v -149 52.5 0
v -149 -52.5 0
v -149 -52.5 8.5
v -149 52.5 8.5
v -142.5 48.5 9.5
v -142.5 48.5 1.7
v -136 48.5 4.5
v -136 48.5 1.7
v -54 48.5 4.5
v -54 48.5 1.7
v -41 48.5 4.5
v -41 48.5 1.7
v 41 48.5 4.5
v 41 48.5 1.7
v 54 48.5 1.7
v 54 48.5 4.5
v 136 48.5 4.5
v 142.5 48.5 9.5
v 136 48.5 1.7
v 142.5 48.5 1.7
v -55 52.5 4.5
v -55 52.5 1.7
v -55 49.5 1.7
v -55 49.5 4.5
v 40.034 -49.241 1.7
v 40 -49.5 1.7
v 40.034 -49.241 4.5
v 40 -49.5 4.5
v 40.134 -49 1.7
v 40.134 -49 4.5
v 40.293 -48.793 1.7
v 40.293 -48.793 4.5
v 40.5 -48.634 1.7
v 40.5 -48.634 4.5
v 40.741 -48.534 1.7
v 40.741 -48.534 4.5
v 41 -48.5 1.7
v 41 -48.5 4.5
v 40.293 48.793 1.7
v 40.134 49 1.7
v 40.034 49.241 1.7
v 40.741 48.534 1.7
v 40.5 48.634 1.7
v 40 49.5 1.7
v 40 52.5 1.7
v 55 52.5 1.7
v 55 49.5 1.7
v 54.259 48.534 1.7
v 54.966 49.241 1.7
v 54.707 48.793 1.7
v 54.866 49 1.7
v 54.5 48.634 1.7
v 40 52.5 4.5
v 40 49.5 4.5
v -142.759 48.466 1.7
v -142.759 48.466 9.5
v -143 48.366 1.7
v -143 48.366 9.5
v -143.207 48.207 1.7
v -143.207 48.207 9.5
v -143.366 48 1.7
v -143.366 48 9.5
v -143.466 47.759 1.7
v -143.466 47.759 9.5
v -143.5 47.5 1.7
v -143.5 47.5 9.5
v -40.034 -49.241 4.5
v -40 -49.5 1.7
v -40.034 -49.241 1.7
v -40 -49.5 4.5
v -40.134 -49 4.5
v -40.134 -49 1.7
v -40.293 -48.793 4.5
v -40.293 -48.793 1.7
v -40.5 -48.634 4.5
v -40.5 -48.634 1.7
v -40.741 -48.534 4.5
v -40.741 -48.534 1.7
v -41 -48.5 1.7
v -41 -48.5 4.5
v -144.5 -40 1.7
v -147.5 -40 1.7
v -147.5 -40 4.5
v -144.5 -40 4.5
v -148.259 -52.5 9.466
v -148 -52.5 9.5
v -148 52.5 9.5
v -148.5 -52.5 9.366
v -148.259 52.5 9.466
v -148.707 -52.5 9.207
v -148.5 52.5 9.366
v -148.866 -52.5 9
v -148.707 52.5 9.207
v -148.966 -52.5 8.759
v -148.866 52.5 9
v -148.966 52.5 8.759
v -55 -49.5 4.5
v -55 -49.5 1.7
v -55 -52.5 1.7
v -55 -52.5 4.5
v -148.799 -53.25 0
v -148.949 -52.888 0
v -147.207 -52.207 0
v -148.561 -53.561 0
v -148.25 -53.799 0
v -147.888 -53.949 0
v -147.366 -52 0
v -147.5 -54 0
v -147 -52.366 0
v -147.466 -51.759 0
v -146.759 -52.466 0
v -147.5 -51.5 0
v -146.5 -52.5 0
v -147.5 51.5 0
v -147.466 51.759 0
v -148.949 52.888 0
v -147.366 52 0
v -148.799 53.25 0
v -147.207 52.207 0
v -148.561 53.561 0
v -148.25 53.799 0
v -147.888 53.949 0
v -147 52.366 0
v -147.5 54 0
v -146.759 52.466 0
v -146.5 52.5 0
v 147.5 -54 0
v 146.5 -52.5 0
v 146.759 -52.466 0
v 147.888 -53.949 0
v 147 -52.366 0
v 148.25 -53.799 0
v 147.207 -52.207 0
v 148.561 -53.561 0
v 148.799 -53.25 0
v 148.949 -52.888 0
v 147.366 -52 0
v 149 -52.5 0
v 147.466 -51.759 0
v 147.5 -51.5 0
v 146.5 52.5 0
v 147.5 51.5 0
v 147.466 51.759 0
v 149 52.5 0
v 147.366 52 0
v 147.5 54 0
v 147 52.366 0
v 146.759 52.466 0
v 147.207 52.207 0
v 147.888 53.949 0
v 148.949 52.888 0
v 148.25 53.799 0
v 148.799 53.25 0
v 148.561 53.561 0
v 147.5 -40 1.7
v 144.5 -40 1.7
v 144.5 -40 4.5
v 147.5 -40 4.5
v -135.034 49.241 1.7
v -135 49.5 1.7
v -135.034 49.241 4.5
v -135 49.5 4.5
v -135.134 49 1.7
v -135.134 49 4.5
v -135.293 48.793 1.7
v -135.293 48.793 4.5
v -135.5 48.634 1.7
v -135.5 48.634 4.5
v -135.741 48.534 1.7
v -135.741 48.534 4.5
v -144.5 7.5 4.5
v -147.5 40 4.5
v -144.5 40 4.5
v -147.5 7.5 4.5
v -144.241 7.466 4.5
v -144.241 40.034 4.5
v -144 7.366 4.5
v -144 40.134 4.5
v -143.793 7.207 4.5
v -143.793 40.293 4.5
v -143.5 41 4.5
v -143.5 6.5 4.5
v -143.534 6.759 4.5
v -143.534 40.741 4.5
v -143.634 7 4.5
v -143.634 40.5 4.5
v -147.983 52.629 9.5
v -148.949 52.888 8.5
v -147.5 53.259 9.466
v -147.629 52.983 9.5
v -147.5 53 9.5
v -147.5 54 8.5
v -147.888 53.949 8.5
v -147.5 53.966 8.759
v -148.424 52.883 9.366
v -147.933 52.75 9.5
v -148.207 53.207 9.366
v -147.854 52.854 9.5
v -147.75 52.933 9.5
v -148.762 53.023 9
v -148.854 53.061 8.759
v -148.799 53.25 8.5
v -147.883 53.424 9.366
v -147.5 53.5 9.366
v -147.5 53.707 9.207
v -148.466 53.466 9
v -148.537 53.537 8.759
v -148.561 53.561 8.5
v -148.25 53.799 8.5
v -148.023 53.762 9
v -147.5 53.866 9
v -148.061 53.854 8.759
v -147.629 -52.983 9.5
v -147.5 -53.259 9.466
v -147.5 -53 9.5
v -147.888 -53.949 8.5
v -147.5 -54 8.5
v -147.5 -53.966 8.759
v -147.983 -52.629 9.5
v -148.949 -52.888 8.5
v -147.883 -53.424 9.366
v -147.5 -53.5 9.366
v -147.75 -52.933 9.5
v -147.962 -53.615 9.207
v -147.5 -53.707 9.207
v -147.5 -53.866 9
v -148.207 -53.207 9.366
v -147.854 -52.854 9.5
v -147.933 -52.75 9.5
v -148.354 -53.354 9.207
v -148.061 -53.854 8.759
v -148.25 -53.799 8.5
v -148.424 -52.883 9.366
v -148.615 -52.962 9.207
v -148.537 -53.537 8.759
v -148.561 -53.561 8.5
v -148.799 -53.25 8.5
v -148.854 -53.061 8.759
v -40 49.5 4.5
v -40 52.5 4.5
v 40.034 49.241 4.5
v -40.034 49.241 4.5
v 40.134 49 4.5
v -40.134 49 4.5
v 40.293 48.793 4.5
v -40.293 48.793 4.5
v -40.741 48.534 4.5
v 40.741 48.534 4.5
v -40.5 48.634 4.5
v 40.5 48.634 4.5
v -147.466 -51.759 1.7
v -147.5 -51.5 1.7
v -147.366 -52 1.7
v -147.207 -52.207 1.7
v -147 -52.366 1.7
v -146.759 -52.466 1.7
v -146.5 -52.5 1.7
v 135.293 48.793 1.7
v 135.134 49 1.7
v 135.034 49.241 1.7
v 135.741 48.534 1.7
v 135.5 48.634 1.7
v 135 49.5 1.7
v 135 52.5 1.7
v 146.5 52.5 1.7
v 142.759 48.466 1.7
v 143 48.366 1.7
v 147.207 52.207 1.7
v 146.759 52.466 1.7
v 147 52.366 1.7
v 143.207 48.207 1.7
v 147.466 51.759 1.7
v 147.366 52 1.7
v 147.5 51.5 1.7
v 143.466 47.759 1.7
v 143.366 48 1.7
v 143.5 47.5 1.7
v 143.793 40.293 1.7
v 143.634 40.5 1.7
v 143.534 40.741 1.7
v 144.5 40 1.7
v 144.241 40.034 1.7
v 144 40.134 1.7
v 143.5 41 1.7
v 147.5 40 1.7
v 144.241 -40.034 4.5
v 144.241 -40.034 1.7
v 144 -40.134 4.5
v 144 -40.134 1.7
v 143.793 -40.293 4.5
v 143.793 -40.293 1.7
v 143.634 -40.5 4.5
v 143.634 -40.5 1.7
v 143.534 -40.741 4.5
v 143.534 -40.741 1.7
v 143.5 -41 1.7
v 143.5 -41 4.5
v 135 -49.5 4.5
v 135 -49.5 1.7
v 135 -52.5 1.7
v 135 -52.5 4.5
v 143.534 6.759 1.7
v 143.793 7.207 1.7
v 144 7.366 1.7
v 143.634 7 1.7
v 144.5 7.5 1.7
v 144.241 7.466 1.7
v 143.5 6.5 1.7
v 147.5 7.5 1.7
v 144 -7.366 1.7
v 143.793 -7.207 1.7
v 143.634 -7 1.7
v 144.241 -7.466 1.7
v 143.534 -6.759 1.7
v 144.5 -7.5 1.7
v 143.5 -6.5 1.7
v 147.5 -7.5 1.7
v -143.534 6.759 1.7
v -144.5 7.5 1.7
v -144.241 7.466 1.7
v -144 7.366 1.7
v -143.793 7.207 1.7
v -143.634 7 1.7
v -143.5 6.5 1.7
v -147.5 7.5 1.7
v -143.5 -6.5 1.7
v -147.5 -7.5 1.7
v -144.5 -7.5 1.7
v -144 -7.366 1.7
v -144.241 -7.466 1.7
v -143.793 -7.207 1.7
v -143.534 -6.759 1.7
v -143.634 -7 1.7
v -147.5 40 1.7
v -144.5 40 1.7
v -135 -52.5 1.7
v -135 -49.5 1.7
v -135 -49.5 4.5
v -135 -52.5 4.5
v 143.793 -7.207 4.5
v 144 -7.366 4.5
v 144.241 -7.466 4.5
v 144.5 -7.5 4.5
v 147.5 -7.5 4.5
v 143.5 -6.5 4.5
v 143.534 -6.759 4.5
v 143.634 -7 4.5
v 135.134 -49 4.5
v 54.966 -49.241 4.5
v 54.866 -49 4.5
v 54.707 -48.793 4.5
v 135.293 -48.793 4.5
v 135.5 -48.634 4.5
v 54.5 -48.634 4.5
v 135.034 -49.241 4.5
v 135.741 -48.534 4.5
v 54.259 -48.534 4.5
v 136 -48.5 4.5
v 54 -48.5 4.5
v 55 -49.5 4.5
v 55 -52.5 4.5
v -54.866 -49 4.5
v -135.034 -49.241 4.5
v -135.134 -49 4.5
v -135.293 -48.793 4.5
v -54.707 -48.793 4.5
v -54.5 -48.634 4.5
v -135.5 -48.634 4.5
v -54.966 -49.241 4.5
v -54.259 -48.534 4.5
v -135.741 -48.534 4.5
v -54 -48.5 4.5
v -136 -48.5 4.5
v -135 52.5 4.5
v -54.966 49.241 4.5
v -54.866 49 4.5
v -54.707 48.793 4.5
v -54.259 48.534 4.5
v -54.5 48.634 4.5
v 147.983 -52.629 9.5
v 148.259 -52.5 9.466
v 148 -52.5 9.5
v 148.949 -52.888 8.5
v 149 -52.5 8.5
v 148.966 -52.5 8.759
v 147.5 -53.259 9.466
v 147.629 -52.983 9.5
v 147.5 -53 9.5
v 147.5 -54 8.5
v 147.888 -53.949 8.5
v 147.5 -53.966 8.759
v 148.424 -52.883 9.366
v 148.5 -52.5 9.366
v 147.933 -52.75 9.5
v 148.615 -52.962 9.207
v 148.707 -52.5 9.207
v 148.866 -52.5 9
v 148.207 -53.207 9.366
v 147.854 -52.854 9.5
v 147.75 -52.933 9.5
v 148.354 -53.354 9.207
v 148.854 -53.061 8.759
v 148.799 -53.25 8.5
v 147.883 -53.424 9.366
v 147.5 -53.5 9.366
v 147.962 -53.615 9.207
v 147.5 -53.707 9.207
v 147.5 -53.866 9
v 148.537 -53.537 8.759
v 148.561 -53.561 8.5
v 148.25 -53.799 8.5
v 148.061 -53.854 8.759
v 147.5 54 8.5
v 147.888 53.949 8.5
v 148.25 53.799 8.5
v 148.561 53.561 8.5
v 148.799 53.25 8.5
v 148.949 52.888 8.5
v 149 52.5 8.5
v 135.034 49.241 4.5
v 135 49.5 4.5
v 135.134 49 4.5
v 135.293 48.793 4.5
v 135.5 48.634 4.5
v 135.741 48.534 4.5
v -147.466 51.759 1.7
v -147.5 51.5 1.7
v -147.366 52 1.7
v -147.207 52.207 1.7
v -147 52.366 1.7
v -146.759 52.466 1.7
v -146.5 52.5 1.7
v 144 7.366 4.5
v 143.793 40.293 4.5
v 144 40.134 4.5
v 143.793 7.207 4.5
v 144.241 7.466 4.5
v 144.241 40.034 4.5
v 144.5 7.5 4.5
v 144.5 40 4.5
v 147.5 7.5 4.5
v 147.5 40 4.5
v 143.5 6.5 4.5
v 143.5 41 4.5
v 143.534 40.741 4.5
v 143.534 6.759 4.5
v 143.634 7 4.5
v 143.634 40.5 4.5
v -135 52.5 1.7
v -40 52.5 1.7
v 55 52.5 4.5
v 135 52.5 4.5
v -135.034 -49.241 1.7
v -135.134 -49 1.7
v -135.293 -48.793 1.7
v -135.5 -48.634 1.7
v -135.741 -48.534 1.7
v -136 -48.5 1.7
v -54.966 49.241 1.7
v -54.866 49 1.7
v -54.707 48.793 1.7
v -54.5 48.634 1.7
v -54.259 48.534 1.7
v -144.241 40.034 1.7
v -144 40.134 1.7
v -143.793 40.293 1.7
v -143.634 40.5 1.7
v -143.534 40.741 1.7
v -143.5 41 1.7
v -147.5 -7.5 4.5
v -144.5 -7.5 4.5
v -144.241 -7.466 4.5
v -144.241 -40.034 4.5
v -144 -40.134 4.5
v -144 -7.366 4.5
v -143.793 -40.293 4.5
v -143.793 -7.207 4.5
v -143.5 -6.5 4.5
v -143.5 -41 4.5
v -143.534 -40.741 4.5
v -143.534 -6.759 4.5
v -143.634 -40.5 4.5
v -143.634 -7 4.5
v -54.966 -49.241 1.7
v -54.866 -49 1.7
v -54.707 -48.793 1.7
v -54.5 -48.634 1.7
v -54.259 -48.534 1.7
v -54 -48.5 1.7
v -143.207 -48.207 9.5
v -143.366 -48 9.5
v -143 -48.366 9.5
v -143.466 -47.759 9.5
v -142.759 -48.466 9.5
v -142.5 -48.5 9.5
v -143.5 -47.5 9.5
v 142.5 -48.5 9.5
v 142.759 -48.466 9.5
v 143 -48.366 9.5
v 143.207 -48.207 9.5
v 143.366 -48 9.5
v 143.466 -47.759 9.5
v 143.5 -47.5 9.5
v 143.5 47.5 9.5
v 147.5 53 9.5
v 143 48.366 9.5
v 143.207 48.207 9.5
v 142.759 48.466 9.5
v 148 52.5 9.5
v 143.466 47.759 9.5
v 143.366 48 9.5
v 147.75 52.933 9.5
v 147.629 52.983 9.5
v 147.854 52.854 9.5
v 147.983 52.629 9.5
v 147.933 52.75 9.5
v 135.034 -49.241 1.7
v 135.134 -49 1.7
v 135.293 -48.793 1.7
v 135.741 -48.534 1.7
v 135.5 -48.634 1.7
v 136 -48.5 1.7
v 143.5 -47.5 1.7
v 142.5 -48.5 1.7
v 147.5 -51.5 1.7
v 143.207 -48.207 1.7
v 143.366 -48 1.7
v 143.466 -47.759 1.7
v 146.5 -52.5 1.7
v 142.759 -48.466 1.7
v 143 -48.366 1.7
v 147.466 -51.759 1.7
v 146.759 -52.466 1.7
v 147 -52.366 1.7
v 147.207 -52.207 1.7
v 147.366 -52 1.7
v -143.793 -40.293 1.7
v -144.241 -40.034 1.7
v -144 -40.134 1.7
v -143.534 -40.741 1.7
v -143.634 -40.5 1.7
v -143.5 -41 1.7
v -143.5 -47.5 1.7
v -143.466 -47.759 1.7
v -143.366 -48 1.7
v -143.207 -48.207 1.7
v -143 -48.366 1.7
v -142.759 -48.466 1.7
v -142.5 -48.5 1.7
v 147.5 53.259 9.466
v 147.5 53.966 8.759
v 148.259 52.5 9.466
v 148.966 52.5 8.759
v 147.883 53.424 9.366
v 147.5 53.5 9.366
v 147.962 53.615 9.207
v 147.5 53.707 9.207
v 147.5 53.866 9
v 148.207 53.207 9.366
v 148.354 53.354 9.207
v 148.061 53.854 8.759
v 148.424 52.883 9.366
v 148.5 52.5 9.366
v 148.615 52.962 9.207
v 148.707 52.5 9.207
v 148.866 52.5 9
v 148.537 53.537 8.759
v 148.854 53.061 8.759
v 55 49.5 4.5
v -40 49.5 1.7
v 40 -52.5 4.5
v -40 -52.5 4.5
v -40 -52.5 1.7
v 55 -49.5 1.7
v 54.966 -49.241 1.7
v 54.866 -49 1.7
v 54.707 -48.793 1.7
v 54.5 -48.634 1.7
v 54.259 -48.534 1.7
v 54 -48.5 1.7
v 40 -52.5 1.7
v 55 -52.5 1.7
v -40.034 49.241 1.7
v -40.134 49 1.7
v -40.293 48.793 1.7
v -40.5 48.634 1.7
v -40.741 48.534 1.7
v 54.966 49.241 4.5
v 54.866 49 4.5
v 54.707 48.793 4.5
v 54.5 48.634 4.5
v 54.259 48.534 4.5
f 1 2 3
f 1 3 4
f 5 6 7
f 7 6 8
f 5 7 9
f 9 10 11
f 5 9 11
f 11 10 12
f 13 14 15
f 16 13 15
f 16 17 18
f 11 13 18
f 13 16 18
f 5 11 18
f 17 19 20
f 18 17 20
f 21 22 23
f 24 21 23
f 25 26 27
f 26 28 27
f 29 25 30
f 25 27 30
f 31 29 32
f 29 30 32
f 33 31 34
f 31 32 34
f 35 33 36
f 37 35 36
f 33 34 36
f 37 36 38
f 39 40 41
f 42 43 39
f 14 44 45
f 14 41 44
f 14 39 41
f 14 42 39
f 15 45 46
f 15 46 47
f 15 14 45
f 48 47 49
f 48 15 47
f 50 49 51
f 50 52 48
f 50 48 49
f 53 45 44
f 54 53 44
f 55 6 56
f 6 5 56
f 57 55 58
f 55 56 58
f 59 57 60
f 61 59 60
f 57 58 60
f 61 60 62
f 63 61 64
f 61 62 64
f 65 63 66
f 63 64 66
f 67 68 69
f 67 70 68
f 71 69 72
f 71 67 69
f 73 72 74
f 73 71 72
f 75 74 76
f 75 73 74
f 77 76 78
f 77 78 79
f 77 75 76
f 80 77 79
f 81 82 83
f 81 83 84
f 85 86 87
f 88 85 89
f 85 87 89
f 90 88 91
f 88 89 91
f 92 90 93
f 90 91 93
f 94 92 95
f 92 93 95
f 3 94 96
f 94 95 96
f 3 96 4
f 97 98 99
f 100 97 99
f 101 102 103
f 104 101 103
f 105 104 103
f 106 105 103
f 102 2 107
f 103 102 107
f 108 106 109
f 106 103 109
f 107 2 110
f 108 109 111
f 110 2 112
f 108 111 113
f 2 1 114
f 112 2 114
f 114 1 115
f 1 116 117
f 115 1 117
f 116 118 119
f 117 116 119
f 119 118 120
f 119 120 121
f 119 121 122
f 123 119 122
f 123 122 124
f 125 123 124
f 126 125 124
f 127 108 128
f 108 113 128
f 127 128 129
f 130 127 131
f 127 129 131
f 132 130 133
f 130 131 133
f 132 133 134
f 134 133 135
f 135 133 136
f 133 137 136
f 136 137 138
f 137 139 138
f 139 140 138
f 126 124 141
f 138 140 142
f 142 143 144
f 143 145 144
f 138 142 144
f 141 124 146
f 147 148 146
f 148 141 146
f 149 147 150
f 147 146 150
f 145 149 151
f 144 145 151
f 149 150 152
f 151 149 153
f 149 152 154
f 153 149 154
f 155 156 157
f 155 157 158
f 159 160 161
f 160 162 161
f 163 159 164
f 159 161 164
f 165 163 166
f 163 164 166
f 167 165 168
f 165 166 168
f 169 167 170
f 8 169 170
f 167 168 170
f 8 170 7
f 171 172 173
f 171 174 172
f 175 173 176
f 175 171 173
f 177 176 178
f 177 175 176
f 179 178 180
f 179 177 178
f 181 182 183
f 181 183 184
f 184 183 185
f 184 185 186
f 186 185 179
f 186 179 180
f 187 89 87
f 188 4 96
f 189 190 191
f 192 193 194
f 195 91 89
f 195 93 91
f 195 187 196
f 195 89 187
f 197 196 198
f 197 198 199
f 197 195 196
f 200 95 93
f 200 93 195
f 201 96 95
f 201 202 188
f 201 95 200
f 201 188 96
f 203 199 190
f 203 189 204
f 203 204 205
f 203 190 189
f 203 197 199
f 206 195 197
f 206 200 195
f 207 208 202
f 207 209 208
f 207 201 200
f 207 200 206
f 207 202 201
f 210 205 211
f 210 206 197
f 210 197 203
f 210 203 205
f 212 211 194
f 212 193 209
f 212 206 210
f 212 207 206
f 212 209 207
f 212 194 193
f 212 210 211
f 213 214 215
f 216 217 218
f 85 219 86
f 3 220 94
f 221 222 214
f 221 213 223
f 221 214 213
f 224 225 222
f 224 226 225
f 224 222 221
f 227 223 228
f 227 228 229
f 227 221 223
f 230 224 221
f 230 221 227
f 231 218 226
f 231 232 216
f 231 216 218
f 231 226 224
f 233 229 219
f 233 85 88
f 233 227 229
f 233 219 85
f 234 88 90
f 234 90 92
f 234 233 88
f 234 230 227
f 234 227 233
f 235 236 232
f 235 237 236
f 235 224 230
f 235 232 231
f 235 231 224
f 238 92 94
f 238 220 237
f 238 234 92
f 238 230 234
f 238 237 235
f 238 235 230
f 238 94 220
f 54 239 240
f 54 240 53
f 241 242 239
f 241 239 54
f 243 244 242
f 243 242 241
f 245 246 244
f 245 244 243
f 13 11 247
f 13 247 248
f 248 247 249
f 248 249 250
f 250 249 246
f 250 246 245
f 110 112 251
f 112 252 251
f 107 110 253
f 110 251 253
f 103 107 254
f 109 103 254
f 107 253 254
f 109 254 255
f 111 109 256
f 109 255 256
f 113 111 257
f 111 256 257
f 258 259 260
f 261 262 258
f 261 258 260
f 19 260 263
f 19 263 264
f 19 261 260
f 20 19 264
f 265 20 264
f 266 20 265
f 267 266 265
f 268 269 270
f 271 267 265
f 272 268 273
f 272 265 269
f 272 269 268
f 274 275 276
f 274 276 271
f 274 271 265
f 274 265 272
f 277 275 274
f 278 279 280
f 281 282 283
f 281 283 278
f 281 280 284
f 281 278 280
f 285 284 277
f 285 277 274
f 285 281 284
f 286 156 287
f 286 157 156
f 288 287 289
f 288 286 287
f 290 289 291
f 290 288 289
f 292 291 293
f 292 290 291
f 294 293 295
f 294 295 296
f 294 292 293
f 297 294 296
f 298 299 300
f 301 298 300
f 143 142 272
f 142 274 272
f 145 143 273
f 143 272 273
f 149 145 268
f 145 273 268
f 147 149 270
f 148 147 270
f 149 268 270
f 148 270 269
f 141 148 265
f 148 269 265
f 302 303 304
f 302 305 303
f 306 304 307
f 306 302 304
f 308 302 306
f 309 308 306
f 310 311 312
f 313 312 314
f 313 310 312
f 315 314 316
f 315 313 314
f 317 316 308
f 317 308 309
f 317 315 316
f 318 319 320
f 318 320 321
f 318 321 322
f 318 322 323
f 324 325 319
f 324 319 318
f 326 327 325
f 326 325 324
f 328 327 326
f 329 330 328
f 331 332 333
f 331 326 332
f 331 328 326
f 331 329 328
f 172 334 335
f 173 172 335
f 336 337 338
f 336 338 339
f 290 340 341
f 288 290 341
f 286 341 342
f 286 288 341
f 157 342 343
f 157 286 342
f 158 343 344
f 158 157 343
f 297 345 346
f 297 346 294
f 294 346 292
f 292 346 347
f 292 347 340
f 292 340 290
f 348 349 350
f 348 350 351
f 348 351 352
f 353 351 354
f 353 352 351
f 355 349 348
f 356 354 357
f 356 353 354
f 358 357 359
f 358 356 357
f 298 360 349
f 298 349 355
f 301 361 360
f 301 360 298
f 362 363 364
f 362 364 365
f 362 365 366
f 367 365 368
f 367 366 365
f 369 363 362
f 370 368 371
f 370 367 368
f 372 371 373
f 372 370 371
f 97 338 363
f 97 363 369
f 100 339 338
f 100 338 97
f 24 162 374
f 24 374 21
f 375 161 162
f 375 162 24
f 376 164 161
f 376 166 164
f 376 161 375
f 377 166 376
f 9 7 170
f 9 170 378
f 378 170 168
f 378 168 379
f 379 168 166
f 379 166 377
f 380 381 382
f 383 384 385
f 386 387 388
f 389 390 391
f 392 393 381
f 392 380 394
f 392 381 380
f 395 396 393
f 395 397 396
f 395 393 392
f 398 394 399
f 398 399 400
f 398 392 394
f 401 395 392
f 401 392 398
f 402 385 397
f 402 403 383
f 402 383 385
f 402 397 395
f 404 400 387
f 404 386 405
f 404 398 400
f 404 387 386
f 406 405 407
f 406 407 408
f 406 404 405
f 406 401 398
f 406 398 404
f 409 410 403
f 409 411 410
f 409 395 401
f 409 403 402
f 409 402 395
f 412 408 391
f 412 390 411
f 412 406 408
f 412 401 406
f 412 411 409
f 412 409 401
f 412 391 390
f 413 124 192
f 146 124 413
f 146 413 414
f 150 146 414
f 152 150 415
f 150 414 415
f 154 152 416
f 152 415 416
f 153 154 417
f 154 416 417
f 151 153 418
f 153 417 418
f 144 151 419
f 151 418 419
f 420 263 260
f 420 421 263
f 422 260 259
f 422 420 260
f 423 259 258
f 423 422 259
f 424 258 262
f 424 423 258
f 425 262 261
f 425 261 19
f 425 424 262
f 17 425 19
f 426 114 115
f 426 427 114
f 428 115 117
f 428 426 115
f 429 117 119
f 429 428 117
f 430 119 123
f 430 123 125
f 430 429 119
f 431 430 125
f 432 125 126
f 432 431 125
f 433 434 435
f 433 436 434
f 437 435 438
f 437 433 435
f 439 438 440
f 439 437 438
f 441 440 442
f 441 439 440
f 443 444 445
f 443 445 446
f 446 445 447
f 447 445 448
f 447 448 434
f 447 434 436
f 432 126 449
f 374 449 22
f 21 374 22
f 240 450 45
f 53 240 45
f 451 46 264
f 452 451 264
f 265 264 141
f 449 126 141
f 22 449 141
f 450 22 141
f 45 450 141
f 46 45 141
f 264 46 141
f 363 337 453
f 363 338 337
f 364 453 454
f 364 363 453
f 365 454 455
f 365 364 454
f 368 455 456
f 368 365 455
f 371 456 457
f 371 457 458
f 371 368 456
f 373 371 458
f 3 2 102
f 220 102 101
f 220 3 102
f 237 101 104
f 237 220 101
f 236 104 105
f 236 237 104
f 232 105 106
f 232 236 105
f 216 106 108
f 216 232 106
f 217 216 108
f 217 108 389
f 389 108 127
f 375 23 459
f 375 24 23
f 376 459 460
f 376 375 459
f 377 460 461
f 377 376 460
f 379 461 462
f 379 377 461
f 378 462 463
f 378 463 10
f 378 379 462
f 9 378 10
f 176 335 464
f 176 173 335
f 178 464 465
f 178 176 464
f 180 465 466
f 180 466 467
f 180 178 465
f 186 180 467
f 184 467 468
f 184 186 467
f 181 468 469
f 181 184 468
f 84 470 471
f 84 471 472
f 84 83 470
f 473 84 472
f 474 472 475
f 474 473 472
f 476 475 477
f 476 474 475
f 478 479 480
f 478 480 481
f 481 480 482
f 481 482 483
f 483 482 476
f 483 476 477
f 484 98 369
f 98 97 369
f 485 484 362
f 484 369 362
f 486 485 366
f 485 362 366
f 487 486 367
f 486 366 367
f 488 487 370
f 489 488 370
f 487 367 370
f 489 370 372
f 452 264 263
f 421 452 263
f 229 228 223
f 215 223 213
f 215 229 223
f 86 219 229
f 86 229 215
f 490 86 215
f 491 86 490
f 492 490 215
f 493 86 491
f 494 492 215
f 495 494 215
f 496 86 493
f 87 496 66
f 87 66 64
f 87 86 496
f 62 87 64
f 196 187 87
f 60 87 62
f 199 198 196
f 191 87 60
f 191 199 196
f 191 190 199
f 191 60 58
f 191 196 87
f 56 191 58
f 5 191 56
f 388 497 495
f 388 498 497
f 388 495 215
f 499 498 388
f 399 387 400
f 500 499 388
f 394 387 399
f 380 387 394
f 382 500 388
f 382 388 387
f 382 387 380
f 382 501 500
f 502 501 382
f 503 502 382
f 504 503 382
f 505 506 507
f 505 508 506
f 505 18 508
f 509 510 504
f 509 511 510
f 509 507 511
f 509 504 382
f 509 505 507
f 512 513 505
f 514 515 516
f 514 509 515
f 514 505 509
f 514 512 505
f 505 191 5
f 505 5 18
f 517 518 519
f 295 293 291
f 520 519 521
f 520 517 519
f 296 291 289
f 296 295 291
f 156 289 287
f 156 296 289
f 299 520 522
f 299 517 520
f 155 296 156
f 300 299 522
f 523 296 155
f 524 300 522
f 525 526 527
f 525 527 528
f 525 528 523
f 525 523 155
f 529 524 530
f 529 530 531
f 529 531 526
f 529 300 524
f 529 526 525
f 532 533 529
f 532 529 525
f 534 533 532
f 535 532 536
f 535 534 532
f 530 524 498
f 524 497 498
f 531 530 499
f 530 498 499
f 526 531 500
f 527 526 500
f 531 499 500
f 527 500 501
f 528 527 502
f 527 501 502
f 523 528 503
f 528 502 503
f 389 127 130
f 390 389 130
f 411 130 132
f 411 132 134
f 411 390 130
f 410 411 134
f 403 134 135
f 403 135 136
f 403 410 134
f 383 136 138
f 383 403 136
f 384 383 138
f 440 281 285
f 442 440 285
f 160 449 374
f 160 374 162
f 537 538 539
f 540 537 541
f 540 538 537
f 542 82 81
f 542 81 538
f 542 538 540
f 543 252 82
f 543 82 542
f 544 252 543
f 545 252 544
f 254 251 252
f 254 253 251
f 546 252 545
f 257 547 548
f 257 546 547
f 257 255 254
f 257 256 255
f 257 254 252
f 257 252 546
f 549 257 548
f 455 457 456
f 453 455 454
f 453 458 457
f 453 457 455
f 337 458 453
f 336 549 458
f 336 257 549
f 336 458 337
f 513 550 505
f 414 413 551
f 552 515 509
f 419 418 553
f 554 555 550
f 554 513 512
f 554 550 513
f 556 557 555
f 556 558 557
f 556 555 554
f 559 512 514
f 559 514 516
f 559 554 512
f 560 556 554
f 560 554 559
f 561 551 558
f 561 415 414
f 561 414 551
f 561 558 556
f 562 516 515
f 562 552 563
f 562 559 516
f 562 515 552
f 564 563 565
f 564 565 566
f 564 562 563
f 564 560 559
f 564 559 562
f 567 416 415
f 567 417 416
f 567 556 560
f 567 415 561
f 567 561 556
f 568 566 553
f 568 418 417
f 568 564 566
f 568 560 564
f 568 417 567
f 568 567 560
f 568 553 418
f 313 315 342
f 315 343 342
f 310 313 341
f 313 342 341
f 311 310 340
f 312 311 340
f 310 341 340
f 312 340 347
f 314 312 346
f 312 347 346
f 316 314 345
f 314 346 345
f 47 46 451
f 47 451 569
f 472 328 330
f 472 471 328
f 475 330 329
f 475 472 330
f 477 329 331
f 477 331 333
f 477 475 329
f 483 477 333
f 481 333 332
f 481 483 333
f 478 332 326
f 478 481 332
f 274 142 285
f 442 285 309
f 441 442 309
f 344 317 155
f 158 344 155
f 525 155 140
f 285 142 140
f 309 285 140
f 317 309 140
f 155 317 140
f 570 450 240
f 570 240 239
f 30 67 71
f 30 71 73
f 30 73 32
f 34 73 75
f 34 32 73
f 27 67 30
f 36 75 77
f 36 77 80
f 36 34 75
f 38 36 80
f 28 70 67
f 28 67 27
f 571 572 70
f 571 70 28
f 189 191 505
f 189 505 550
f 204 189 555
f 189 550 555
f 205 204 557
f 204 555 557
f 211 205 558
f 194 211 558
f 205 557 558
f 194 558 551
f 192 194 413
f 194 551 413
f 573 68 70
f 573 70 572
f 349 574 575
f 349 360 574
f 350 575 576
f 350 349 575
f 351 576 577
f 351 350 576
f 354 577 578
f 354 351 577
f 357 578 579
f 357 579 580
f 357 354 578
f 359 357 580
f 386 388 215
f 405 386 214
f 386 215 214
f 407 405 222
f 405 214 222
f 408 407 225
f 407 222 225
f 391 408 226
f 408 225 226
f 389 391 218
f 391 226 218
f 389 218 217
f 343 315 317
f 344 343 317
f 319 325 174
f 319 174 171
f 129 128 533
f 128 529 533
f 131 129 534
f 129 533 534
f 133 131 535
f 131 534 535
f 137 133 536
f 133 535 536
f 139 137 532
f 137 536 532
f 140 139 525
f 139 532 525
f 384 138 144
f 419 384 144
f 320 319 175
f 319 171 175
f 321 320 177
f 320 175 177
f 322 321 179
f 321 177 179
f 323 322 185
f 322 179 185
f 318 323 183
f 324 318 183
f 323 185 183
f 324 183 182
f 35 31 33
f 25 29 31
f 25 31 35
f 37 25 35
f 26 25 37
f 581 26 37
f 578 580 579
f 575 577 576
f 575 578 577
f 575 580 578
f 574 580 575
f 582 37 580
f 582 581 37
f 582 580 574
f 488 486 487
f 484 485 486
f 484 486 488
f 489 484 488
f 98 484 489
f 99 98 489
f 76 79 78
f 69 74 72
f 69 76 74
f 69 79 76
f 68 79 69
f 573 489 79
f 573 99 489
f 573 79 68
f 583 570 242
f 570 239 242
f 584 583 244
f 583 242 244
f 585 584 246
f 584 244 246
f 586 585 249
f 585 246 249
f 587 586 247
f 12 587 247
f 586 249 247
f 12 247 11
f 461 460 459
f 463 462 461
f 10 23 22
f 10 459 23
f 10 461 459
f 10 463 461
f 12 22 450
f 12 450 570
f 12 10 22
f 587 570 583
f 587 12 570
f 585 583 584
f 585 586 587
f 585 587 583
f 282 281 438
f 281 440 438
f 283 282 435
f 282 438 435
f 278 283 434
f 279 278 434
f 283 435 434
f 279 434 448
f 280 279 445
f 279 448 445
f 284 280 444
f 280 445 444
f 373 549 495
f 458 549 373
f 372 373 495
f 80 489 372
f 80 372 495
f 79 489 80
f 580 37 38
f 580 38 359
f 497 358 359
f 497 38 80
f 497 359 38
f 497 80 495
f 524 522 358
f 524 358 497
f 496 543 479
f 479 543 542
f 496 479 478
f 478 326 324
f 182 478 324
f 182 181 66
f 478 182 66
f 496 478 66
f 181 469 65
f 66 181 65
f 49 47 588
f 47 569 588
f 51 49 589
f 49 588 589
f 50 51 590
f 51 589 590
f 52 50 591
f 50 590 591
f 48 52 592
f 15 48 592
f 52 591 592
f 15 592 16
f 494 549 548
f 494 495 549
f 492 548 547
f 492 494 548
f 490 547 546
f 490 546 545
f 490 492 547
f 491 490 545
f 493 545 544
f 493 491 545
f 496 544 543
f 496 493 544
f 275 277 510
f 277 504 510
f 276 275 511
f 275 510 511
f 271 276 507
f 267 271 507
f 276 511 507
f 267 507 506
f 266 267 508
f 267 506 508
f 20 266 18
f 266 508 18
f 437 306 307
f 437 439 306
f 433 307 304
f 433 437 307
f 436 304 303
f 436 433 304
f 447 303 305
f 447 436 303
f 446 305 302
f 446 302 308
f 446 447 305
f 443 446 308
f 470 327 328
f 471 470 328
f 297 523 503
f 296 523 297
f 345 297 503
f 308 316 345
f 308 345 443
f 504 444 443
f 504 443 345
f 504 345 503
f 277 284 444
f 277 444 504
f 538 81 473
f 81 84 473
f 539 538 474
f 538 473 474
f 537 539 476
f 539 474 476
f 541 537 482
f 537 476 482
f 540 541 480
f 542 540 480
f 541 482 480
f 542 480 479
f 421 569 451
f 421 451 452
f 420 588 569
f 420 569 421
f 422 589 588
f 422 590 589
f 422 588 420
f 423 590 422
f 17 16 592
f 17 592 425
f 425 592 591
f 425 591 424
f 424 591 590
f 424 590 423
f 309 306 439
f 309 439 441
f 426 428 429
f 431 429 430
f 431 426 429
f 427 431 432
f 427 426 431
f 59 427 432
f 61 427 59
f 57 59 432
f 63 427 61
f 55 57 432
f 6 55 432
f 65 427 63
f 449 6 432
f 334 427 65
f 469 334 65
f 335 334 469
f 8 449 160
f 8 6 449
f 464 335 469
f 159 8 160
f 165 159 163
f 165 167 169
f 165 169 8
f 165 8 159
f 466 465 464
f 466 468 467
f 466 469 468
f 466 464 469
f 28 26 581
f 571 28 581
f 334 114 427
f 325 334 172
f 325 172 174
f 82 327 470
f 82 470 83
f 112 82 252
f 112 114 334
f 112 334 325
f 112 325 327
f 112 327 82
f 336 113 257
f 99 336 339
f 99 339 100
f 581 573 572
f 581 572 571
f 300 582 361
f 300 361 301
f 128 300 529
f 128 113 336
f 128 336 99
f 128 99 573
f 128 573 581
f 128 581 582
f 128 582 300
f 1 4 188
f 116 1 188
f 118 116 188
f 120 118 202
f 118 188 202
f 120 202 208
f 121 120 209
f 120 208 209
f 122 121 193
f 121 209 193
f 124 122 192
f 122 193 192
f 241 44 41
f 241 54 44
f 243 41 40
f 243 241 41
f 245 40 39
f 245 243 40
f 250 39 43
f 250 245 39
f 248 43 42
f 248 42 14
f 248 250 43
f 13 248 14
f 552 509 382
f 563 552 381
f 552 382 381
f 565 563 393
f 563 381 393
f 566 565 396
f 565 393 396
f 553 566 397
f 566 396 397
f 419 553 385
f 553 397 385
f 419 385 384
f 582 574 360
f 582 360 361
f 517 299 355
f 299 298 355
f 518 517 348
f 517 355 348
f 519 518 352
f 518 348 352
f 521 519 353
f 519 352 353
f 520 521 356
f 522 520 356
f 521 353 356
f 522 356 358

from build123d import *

# Parameters (mm, degrees)
SKETCH001_W     = 298
SKETCH001_H     = 108
SKETCH001_W_2   = 287
SKETCH001_H_2   = 97
PAD_DEPTH       = 9.5
SKETCH002_W     = 295
SKETCH002_H     = 105
POCKET_DEPTH    = 1.7
SKETCH003_W     = 80
SKETCH003_H     = 4
POCKET001_DEPTH = 2.8
SKETCH004_W     = 4
SKETCH004_H     = 32.5
POCKET002_DEPTH = 2.8
FILLET_R        = 1.5
FILLET001_R     = 1
FILLET002_R     = 1
FILLET003_R     = 1
FILLET004_R     = 1


with BuildPart() as part:
    # Sketch001 → Pad (new body)
    with BuildSketch(Plane.XY):
        Rectangle(SKETCH001_W, SKETCH001_H)
        Rectangle(SKETCH001_W_2, SKETCH001_H_2, mode=Mode.SUBTRACT)
    extrude(amount=PAD_DEPTH)

    # Sketch002 (on Face9 of Pad) → Pocket (cut)
    with BuildSketch(Plane(origin=(0, 0, 0), x_dir=(1, 0, 0), z_dir=(0, 0, -1))):
        Rectangle(SKETCH002_W, SKETCH002_H)
    extrude(amount=-POCKET_DEPTH, mode=Mode.SUBTRACT)

    # Sketch003 (on Face15 of Pocket) → Pocket001 (cut)
    with BuildSketch(Plane(origin=(0, 0, 1.7), x_dir=(1, 0, 0), z_dir=(0, 0, -1))):
        with Locations((-95, 50.5)):
            Rectangle(SKETCH003_W, SKETCH003_H)
        with Locations((0, 50.5)):
            Rectangle(SKETCH003_W, SKETCH003_H)
        with Locations((95, 50.5)):
            Rectangle(SKETCH003_W, SKETCH003_H)
        with Locations((-95, -50.5)):
            Rectangle(SKETCH003_W, SKETCH003_H)
        with Locations((0, -50.5)):
            Rectangle(SKETCH003_W, SKETCH003_H)
        with Locations((95, -50.5)):
            Rectangle(SKETCH003_W, SKETCH003_H)
    extrude(amount=-POCKET001_DEPTH, mode=Mode.SUBTRACT)

    # Sketch004 (on Face15 of Pocket001) → Pocket002 (cut)
    with BuildSketch(Plane(origin=(0, 0, 1.7), x_dir=(1, 0, 0), z_dir=(0, 0, -1))):
        with Locations((145.5, 23.75)):
            Rectangle(SKETCH004_W, SKETCH004_H)
        with Locations((145.5, -23.75)):
            Rectangle(SKETCH004_W, SKETCH004_H)
        with Locations((-145.5, 23.75)):
            Rectangle(SKETCH004_W, SKETCH004_H)
        with Locations((-145.5, -23.75)):
            Rectangle(SKETCH004_W, SKETCH004_H)
    extrude(amount=-POCKET002_DEPTH, mode=Mode.SUBTRACT)

    # Fillet
    fillet_edges = [part.edges().sort_by_distance(p)[0] for p in [
        (149, -54, 4.75),
        (-149, -54, 4.75),
        (-149, 54, 4.75),
        (149, 54, 4.75),
    ]]
    fillet(fillet_edges, radius=FILLET_R)

    # Fillet001
    fillet001_edges = [part.edges().sort_by_distance(p)[0] for p in [
        (0, 54, 9.5),
    ]]
    fillet(fillet001_edges, radius=FILLET001_R)

    # Fillet002
    fillet002_edges = [part.edges().sort_by_distance(p)[0] for p in [
        (-147.5, 52.5, 0.85),
        (-147.5, -52.5, 0.85),
        (147.5, -52.5, 0.85),
        (147.5, 52.5, 0.85),
    ]]
    fillet(fillet002_edges, radius=FILLET002_R)

    # Fillet003
    fillet003_edges = [part.edges().sort_by_distance(p)[0] for p in [
        (143.5, 40, 3.1),
        (135, 48.5, 3.1),
        (55, 48.5, 3.1),
        (40, 48.5, 3.1),
        (-55, 48.5, 3.1),
        (-40, 48.5, 3.1),
        (-135, 48.5, 3.1),
        (-143.5, 40, 3.1),
        (-143.5, -7.5, 3.1),
        (143.5, -7.5, 3.1),
        (143.5, 7.5, 3.1),
        (143.5, -40, 3.1),
        (135, -48.5, 3.1),
        (40, -48.5, 3.1),
        (-55, -48.5, 3.1),
        (-143.5, 7.5, 3.1),
        (-143.5, -40, 3.1),
        (-135, -48.5, 3.1),
        (-40, -48.5, 3.1),
        (55, -48.5, 3.1),
    ]]
    fillet(fillet003_edges, radius=FILLET003_R)

    # Fillet004
    fillet004_edges = [part.edges().sort_by_distance(p)[0] for p in [
        (-143.5, -48.5, 5.6),
        (143.5, 48.5, 5.6),
        (143.5, -48.5, 5.6),
        (-143.5, 48.5, 5.6),
    ]]
    fillet(fillet004_edges, radius=FILLET004_R)


solid = part.part
